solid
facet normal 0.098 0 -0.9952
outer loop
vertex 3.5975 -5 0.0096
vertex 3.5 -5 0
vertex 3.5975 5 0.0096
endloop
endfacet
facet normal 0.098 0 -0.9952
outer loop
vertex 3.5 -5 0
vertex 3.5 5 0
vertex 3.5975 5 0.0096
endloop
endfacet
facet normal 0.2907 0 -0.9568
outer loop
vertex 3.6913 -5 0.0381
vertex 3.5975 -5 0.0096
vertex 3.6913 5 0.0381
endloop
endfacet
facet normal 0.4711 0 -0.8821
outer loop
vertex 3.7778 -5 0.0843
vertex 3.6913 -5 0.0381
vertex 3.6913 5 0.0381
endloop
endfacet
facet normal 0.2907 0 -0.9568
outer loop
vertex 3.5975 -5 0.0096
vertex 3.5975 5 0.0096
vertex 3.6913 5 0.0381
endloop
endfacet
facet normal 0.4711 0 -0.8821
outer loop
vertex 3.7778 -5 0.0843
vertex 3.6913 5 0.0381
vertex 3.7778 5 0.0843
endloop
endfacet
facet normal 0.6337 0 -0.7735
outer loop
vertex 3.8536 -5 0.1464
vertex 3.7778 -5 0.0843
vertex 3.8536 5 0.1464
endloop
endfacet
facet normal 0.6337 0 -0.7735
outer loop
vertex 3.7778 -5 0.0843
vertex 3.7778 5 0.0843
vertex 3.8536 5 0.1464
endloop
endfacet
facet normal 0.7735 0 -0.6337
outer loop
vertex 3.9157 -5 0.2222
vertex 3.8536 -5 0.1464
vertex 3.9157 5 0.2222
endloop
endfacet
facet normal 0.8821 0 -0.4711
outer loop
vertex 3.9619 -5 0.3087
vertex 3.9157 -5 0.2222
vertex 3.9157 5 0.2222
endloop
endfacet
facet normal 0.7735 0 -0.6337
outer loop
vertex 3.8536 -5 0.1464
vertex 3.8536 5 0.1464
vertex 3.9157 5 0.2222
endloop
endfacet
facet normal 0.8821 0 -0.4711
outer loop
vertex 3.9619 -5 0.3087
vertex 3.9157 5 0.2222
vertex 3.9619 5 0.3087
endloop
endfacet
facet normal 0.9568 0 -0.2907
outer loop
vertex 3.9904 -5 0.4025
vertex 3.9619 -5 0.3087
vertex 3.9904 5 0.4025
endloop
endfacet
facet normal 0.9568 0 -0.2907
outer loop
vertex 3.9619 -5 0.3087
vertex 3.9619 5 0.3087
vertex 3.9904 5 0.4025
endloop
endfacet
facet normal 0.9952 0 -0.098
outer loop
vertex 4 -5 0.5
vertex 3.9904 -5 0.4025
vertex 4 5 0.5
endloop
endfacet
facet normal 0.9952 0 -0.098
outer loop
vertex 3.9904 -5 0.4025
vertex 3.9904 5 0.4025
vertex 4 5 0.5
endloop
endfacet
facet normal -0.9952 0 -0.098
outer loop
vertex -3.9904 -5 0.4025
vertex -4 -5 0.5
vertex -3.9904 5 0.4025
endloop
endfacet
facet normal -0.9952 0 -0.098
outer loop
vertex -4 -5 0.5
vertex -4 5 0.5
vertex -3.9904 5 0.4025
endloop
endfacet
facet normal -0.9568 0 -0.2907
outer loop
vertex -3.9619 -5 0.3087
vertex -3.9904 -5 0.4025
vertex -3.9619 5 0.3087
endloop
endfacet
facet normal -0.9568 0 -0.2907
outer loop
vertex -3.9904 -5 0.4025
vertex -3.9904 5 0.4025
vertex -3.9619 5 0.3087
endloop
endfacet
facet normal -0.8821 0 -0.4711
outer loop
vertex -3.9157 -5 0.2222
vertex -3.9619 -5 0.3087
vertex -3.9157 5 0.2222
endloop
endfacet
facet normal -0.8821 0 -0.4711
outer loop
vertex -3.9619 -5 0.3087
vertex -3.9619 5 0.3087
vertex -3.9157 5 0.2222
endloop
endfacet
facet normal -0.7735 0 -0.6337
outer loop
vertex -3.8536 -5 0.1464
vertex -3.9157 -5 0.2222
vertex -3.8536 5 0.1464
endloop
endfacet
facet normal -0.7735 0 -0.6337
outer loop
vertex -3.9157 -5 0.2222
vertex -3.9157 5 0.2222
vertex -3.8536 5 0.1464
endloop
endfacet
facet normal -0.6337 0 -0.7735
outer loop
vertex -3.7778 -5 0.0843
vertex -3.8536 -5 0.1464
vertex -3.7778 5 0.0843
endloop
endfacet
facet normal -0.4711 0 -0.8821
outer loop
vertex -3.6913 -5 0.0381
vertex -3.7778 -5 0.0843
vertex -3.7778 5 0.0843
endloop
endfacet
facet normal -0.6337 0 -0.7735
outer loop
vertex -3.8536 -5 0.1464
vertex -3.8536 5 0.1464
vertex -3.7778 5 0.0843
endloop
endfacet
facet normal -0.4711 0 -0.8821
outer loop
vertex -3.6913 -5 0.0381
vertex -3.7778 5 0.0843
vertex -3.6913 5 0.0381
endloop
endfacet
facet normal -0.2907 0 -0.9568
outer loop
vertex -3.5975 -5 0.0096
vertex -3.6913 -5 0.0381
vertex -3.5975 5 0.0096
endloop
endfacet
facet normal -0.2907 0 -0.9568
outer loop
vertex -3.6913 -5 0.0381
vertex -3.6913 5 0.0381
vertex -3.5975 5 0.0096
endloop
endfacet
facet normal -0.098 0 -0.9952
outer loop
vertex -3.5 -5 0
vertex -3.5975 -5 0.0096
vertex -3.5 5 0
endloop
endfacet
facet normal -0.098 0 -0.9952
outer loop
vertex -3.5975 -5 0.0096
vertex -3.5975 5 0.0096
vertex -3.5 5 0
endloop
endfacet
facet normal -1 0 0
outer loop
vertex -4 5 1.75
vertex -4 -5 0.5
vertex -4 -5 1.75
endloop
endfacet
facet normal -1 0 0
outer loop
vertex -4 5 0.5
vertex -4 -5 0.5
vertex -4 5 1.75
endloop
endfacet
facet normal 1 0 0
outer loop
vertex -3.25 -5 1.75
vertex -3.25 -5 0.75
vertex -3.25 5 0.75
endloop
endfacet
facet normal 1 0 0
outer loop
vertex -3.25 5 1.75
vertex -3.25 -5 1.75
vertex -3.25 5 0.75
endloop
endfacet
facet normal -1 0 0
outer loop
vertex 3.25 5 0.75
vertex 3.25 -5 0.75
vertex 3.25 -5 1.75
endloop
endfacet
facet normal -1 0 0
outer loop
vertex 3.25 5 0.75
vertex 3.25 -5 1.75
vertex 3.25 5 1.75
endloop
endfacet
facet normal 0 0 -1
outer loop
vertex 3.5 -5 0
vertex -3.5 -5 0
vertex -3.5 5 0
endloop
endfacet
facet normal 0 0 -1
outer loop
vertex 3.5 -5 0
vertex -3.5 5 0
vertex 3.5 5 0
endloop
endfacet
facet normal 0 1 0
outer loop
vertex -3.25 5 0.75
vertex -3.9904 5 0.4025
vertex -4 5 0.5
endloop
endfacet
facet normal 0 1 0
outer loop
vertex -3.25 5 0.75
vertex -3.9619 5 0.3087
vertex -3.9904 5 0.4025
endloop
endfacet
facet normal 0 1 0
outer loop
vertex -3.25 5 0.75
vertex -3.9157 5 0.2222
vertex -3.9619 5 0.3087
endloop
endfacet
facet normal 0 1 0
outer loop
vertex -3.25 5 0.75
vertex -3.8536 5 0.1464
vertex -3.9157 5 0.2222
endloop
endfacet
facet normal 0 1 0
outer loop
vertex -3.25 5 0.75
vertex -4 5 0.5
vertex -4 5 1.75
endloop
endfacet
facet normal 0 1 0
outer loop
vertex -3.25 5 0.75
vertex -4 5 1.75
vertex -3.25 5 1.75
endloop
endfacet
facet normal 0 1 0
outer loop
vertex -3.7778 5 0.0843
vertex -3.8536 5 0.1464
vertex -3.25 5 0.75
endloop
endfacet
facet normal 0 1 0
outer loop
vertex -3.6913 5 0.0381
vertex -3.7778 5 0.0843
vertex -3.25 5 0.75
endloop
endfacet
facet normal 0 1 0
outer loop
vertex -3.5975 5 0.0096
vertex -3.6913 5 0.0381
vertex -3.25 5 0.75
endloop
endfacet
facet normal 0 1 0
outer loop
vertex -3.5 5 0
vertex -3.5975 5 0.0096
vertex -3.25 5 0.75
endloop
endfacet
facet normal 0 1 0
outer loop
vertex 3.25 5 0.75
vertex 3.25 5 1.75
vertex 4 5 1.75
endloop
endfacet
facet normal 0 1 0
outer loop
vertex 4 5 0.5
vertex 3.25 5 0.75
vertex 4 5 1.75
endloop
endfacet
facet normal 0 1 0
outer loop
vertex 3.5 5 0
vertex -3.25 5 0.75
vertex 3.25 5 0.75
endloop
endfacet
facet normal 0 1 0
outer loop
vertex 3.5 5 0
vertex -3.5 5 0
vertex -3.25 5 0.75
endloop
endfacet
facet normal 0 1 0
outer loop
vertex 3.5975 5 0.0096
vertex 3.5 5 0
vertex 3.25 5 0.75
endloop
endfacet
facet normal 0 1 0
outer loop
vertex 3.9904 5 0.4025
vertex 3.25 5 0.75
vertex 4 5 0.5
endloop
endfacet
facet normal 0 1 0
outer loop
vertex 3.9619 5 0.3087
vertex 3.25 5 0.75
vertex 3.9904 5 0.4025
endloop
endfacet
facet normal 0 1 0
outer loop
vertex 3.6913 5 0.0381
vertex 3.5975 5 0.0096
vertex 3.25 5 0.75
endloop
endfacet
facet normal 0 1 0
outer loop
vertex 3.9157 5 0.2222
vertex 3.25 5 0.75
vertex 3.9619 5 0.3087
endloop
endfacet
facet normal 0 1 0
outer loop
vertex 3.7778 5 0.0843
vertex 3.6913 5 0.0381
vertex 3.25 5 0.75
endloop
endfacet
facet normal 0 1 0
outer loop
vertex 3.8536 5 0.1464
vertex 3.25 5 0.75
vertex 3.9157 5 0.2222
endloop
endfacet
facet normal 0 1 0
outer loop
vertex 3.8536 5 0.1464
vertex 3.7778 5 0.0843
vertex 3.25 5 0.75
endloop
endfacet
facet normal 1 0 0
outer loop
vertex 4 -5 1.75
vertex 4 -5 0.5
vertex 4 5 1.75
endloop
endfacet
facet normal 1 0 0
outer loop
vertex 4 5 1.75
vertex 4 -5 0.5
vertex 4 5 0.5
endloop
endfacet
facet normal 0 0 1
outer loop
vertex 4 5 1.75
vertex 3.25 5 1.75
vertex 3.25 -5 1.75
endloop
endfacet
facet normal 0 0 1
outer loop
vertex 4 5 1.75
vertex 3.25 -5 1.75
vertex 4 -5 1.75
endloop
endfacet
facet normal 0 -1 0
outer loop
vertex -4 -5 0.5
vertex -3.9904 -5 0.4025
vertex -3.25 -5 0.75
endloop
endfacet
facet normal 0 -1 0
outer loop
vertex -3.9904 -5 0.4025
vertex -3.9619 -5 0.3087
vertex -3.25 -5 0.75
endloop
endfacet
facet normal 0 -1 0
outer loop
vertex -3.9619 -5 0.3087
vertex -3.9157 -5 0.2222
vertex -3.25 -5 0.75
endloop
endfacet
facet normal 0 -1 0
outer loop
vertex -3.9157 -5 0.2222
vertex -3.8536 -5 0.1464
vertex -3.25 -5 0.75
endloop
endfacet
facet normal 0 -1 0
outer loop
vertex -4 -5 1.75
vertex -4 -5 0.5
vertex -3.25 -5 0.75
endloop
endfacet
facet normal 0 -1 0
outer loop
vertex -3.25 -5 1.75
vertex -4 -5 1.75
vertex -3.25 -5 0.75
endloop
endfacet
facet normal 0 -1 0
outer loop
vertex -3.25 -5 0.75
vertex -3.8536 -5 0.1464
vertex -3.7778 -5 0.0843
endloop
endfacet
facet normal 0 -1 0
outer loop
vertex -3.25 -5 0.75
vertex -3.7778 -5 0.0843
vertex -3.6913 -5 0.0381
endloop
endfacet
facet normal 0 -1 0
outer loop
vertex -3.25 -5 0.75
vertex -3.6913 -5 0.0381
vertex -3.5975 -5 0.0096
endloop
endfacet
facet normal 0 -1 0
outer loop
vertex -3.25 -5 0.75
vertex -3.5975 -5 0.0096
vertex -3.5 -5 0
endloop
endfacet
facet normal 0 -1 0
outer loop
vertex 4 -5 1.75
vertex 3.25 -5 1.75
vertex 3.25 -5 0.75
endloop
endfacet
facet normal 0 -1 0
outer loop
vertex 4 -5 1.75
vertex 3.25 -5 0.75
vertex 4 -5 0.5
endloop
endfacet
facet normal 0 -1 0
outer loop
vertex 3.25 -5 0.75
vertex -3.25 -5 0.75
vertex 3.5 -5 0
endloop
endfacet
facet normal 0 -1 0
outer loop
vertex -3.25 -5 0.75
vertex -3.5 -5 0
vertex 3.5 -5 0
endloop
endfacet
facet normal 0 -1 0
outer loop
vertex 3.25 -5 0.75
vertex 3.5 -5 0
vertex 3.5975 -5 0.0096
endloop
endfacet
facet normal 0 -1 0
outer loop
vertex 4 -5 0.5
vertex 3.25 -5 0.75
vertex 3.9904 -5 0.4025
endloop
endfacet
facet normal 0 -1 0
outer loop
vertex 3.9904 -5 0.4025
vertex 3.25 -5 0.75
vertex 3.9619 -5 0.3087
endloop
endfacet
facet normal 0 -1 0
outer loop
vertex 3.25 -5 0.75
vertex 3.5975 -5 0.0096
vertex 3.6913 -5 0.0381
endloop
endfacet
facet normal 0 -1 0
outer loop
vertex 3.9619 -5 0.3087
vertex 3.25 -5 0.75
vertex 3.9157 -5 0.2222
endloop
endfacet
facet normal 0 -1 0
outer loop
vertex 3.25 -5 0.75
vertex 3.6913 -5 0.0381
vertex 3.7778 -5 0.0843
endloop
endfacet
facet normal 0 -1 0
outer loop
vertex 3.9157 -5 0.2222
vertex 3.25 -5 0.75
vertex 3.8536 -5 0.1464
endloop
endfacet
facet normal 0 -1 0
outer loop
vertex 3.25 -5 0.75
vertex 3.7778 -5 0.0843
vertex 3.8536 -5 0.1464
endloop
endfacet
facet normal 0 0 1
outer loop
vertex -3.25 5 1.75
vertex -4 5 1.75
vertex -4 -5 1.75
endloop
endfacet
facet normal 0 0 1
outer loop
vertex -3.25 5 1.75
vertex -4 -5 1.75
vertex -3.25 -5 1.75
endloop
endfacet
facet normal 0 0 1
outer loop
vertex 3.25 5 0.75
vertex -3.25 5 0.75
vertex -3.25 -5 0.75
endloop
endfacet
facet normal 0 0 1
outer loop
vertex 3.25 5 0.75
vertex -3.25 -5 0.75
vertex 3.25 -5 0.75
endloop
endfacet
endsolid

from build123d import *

# Parameters (mm, degrees)
SKETCH1_W           = 6.5
SKETCH1_H           = 10
BOSS_EXTRUDE1_DEPTH = 0.75
SKETCH1_3_W         = 0.75
SKETCH1_3_H         = 10
BOSS_EXTRUDE2_DEPTH = 1.75
FILLET1_R           = 0.5


with BuildPart() as part:
    # Sketch1 → Boss-Extrude1 (new body)
    with BuildSketch(Plane.XY):
        Rectangle(SKETCH1_W, SKETCH1_H)
    extrude(amount=BOSS_EXTRUDE1_DEPTH)

    # Sketch1<3> → Boss-Extrude2 (add)
    with BuildSketch(Plane.XY):
        with Locations((3.625, 0)):
            Rectangle(SKETCH1_3_W, SKETCH1_3_H)
        with Locations((-3.625, 0)):
            Rectangle(SKETCH1_3_W, SKETCH1_3_H)
    extrude(amount=BOSS_EXTRUDE2_DEPTH)

    # Fillet1
    fillet1_edges = [part.edges().sort_by_distance(p)[0] for p in [
        (4, 0, 0),
        (-4, 0, 0),
    ]]
    fillet(fillet1_edges, radius=FILLET1_R)


solid = part.part
